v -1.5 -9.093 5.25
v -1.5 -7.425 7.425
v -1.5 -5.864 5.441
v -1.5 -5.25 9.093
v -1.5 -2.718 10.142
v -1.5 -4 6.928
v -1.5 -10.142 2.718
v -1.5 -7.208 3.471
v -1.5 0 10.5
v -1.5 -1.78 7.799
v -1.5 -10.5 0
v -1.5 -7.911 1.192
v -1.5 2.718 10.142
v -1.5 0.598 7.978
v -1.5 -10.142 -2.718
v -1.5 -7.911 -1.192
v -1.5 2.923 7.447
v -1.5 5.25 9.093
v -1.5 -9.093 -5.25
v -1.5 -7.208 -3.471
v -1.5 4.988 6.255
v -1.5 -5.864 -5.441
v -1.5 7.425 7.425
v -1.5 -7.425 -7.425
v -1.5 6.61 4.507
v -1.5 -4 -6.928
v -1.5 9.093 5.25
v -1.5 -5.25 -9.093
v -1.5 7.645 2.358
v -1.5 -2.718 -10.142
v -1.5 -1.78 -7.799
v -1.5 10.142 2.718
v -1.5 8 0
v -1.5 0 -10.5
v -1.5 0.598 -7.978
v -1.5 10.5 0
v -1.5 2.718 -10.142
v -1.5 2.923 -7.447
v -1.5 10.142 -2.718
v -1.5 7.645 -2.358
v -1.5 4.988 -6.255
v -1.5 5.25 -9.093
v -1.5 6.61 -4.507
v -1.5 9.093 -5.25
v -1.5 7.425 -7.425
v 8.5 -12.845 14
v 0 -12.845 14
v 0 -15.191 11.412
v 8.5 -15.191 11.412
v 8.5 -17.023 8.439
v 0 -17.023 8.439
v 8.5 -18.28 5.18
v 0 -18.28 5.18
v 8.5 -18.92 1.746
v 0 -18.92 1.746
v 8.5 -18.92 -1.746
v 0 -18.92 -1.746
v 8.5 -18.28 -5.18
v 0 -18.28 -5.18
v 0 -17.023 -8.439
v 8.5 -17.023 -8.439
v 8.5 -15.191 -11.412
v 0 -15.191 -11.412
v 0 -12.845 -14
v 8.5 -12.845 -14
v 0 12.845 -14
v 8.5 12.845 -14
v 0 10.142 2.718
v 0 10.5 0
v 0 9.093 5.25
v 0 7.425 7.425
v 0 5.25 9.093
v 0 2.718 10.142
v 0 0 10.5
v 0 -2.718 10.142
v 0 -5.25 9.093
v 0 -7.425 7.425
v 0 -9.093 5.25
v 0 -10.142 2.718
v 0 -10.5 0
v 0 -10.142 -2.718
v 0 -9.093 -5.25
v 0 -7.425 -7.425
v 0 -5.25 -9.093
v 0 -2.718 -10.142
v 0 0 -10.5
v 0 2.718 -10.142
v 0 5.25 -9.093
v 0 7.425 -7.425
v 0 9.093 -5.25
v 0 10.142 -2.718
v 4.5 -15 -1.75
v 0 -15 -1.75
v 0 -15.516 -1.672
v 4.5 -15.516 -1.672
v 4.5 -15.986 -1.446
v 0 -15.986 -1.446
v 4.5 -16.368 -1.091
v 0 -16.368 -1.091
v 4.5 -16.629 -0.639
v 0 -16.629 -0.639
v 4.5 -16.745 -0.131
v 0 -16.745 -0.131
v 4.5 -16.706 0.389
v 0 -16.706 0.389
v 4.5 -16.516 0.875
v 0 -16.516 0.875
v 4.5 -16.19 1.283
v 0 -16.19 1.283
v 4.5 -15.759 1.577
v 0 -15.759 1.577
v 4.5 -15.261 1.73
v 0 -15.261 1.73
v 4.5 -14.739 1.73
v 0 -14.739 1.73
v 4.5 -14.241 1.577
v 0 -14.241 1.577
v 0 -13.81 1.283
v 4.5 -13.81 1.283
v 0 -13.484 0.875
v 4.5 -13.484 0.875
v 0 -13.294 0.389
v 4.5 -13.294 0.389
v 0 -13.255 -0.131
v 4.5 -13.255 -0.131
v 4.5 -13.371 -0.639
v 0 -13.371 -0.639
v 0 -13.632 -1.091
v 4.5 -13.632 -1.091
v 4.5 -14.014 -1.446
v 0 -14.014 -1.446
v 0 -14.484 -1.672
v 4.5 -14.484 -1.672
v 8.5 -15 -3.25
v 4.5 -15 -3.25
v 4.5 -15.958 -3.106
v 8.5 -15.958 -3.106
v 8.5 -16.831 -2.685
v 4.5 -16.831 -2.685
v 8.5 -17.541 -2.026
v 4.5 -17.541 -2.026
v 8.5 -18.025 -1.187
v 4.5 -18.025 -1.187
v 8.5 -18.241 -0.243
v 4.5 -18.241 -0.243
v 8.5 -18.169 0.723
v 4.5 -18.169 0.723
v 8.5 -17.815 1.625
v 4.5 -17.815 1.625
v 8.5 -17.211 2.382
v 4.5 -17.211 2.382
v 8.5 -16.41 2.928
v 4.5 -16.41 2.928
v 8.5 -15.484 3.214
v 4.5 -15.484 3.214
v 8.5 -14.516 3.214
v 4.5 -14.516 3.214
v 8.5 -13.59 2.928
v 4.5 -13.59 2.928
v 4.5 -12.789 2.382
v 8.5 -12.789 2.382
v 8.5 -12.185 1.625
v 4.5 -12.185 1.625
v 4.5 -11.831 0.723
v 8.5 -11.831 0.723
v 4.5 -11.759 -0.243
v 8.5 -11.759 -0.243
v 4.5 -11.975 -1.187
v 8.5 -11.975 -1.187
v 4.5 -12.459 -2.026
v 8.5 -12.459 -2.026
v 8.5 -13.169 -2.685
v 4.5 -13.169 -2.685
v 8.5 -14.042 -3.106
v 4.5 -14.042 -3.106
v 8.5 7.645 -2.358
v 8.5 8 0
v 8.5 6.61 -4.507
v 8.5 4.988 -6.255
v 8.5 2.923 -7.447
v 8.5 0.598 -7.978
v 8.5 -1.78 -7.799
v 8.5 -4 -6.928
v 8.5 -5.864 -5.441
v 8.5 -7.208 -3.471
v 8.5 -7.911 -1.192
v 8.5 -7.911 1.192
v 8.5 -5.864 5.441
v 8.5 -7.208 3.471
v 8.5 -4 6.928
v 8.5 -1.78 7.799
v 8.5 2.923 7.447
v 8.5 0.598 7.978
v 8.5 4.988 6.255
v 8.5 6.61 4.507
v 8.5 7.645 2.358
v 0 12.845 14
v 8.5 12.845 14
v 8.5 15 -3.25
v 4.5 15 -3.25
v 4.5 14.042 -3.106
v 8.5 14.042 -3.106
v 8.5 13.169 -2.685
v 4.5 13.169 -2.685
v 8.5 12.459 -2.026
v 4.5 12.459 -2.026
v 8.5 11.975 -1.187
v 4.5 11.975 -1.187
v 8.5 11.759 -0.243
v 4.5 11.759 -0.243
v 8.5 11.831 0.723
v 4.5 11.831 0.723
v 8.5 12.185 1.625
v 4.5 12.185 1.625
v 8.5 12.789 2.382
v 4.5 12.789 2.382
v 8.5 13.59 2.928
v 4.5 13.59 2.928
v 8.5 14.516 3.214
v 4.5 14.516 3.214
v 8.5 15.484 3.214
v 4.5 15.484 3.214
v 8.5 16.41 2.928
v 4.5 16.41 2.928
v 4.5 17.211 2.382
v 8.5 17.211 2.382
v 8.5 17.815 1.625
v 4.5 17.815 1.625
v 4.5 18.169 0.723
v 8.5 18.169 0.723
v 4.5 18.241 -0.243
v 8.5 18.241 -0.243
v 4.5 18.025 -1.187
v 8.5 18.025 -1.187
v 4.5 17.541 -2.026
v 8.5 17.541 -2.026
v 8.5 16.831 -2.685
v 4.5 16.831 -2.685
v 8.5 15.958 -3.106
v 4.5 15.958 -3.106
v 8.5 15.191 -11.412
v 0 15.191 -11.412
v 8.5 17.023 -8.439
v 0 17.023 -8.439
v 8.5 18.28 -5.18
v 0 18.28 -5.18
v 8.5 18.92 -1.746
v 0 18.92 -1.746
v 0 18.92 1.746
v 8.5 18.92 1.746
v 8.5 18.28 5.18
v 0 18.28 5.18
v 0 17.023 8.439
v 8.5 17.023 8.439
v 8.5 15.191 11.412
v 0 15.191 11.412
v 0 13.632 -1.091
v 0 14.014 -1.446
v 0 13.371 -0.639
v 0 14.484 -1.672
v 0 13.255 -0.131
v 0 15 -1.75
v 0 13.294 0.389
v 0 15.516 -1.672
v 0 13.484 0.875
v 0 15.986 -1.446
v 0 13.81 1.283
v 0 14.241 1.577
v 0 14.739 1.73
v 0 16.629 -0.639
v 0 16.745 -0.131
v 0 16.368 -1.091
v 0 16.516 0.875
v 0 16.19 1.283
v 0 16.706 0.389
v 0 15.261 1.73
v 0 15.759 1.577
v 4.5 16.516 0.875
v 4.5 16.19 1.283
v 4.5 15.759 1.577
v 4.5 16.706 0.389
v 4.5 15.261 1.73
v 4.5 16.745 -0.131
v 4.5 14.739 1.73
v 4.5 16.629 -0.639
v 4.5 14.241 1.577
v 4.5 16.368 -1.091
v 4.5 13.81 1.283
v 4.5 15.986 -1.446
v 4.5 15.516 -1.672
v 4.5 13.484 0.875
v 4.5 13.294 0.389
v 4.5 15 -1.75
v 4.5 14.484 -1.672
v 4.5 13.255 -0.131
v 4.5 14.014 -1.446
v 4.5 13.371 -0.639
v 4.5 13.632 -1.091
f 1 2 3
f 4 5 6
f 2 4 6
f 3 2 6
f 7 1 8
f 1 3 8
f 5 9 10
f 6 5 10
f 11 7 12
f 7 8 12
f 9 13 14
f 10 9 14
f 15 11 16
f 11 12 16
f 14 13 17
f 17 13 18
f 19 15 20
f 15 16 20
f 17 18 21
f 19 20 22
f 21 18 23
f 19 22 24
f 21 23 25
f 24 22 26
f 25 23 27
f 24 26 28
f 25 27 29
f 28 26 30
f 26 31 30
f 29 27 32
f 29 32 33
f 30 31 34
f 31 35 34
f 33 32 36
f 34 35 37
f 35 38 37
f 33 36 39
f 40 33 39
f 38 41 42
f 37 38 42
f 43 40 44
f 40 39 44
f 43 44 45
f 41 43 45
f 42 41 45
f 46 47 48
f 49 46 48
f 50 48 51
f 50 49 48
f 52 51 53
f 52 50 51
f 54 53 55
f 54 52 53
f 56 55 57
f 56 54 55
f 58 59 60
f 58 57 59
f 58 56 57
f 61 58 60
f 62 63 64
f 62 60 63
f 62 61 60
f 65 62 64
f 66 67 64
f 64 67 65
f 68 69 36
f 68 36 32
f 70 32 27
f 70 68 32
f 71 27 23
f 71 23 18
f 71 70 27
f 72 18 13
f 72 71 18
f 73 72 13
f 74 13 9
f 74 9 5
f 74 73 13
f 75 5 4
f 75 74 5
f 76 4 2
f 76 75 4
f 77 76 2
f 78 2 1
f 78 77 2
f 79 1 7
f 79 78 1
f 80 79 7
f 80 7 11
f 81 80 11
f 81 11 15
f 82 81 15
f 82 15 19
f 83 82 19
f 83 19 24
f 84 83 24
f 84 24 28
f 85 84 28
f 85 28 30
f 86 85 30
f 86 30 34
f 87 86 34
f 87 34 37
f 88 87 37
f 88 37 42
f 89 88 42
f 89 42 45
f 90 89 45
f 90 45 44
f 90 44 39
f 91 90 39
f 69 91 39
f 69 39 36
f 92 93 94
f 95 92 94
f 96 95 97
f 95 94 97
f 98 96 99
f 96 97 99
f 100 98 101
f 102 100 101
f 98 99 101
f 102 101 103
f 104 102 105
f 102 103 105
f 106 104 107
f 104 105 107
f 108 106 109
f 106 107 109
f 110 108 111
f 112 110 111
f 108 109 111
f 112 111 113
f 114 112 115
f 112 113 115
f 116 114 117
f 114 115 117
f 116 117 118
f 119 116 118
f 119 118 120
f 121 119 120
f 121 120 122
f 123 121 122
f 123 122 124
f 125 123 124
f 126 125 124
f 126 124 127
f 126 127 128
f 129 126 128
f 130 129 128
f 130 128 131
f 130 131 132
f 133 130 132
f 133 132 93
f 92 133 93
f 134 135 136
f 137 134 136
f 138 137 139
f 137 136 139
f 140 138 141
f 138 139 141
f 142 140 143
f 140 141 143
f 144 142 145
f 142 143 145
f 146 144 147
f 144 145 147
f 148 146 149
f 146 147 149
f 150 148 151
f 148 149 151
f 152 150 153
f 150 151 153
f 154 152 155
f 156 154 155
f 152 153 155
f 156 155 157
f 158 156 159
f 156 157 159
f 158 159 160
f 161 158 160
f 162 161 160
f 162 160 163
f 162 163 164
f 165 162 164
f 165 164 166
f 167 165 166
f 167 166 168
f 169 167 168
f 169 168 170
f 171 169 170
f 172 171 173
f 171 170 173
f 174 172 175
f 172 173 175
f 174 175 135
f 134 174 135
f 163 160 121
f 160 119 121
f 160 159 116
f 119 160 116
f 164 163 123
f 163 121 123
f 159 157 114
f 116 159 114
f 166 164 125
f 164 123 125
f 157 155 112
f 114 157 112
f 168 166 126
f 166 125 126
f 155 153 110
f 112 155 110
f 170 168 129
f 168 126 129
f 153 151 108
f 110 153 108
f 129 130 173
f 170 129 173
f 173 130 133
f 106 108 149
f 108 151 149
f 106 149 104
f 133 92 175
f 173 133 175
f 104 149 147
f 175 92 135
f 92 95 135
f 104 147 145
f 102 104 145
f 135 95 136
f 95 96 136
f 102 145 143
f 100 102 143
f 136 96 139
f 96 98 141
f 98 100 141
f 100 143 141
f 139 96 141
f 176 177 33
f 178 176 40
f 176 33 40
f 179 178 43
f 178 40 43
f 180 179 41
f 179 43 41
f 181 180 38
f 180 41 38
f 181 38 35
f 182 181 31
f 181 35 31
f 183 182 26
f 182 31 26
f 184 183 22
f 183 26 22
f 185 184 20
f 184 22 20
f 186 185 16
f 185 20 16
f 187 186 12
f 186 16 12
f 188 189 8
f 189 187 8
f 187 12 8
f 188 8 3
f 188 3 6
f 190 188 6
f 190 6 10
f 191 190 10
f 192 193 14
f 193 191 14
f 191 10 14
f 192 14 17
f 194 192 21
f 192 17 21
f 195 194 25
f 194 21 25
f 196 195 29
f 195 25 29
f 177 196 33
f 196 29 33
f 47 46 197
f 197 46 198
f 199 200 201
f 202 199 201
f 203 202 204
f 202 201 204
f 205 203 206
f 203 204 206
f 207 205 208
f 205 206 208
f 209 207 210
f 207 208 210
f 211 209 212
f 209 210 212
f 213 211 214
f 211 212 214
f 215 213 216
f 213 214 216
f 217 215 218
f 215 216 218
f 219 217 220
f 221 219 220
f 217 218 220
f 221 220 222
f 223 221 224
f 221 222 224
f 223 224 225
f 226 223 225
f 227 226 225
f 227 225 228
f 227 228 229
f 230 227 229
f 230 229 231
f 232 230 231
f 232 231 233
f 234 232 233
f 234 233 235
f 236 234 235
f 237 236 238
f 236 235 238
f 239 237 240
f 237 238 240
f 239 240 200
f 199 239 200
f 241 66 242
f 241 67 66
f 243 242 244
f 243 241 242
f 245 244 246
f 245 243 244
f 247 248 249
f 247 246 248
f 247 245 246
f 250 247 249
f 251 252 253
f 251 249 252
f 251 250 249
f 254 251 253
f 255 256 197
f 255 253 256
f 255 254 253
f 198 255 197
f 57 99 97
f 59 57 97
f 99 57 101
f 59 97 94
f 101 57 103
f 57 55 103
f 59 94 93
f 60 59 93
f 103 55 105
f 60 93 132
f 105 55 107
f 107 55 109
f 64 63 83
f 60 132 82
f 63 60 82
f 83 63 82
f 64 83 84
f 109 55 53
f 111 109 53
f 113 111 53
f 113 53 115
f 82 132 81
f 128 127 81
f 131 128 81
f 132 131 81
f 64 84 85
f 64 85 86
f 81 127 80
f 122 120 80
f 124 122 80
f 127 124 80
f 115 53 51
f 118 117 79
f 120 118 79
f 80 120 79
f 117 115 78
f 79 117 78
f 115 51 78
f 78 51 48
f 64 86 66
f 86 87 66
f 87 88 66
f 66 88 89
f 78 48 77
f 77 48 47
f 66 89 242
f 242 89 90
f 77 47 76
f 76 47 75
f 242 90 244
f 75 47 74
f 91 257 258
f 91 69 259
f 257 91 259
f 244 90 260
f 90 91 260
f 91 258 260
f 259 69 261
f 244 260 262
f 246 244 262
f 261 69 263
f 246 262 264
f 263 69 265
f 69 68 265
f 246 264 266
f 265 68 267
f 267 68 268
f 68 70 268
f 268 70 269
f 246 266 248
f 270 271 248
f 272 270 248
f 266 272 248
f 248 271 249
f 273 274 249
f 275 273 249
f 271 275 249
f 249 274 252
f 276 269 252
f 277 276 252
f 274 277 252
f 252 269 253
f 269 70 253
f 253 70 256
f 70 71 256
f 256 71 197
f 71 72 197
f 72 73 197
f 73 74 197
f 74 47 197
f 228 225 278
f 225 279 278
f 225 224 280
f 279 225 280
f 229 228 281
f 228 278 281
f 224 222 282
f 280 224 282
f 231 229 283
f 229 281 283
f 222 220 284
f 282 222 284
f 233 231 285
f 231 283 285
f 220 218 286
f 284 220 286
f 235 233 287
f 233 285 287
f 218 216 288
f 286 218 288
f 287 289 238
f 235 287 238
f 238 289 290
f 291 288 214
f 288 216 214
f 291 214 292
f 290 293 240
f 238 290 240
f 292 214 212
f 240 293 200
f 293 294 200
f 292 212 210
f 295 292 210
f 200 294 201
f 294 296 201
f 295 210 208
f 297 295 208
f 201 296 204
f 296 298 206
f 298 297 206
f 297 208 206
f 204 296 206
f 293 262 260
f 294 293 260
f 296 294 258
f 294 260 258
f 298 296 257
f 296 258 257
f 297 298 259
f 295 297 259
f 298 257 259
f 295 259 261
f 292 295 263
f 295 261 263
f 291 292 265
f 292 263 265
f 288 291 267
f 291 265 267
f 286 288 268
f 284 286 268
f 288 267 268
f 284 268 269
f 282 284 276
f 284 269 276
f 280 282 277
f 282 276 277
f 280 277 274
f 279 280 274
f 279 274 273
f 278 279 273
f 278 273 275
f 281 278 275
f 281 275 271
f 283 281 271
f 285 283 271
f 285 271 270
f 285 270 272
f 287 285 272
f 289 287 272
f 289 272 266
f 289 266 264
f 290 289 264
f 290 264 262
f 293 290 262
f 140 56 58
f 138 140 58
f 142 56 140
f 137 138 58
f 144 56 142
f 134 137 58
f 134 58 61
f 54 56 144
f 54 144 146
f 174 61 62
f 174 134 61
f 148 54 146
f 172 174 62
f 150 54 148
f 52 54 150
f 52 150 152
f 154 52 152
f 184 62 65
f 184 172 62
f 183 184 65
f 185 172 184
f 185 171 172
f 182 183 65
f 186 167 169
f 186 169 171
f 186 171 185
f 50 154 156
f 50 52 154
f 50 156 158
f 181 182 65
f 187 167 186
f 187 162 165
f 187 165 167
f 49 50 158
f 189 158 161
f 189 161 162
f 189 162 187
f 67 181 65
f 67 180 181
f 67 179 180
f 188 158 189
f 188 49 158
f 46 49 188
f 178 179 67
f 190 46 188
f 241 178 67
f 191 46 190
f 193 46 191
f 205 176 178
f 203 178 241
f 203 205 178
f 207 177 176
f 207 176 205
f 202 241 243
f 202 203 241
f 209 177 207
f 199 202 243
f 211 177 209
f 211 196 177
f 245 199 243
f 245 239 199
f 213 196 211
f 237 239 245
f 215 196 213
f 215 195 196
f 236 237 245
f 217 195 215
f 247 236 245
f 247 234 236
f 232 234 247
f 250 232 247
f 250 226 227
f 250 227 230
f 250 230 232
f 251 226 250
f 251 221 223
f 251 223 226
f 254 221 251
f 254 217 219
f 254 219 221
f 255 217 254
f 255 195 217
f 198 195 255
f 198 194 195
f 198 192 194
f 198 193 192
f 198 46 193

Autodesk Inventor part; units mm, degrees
ref_plane "YZ Plane" through (0, 0, 0) normal (1, 0, 0) x (0, 1, 0)
ref_plane "XZ Plane" through (0, 0, 0) normal (0, 1, 0) x (-1, 0, 0)
ref_plane "XY Plane" through (0, 0, 0) normal (0, 0, 1) x (1, 0, 0)
sketch "Sketch1" plane through (0, 0, 0) normal (0, 0, 1) x (1, 0, 0)
  line L0 (-2, 10.5) -> (0, 10.5)
  line L1 (0, 10.5) -> (0, 19)
  line L2 (0, 19) -> (8.5, 19)
  line L3 (8.5, 19) -> (8.5, 8)
  line L4 (8.5, 8) -> (-2, 8)
  line L5 (-2, 8) -> (-2, 10.5)
  line L6 (-3.774, 0) -> (9.2238, 0)
  point P0 (0, 0)
  dimension "d0" = 38
  dimension "d1" = 8.5
  dimension "d2" = 10.5
  dimension "d3" = 16
  dimension "d4" = 21
revolve "Revolution1" add sketch "Sketch1" angle 360 about axis through (-3.774, 0, 0) along (1, 0, 0)
sketch "Sketch2" plane through (8.5, 0, 0) normal (1, 0, 0) x (0, 0, -1)
  line L0 (14, -19) -> (-14, -19)
  line L1 (-14, -19) -> (-14, 19)
  line L2 (-14, 19) -> (14, 19)
  line L3 (14, 19) -> (14, -19)
  line L4 (14, -19) -> (-14, 19) construction
  line L5 (-14, -19) -> (14, 19) construction
  circle A0 centre (0, 0) radius 19 projected
  dimension "d6" = 28
extrude "Extrusion1" cut sketch "Sketch2" against normal blind 10 contours L0 A0 L3 | L0 L1 A0 | A0 L1 L3 | A0 L2 L3 | L1 L2 A0 keep common part
sketch "Sketch3" plane through (8.5, -12.8452, 14) normal (1, 0, 0) x (0, 0, -1)
  point P0 (14, 12.8452)
  point P1 (14, -2.1548)
  point P2 (14, 27.8452)
  dimension "d9" = 30
  dimension "d10" = 15
hole "Hole1" at (8.5, -15, 0) at (8.5, 15, 0) direction (-1, 0, 0) diameter 3.5 end through all counterbore diameter 6.5 counterbore depth 4
equation "\"d10\" = 0.5 * d9"
properties part number "Endpuffer" material "PMMA Plastic"
